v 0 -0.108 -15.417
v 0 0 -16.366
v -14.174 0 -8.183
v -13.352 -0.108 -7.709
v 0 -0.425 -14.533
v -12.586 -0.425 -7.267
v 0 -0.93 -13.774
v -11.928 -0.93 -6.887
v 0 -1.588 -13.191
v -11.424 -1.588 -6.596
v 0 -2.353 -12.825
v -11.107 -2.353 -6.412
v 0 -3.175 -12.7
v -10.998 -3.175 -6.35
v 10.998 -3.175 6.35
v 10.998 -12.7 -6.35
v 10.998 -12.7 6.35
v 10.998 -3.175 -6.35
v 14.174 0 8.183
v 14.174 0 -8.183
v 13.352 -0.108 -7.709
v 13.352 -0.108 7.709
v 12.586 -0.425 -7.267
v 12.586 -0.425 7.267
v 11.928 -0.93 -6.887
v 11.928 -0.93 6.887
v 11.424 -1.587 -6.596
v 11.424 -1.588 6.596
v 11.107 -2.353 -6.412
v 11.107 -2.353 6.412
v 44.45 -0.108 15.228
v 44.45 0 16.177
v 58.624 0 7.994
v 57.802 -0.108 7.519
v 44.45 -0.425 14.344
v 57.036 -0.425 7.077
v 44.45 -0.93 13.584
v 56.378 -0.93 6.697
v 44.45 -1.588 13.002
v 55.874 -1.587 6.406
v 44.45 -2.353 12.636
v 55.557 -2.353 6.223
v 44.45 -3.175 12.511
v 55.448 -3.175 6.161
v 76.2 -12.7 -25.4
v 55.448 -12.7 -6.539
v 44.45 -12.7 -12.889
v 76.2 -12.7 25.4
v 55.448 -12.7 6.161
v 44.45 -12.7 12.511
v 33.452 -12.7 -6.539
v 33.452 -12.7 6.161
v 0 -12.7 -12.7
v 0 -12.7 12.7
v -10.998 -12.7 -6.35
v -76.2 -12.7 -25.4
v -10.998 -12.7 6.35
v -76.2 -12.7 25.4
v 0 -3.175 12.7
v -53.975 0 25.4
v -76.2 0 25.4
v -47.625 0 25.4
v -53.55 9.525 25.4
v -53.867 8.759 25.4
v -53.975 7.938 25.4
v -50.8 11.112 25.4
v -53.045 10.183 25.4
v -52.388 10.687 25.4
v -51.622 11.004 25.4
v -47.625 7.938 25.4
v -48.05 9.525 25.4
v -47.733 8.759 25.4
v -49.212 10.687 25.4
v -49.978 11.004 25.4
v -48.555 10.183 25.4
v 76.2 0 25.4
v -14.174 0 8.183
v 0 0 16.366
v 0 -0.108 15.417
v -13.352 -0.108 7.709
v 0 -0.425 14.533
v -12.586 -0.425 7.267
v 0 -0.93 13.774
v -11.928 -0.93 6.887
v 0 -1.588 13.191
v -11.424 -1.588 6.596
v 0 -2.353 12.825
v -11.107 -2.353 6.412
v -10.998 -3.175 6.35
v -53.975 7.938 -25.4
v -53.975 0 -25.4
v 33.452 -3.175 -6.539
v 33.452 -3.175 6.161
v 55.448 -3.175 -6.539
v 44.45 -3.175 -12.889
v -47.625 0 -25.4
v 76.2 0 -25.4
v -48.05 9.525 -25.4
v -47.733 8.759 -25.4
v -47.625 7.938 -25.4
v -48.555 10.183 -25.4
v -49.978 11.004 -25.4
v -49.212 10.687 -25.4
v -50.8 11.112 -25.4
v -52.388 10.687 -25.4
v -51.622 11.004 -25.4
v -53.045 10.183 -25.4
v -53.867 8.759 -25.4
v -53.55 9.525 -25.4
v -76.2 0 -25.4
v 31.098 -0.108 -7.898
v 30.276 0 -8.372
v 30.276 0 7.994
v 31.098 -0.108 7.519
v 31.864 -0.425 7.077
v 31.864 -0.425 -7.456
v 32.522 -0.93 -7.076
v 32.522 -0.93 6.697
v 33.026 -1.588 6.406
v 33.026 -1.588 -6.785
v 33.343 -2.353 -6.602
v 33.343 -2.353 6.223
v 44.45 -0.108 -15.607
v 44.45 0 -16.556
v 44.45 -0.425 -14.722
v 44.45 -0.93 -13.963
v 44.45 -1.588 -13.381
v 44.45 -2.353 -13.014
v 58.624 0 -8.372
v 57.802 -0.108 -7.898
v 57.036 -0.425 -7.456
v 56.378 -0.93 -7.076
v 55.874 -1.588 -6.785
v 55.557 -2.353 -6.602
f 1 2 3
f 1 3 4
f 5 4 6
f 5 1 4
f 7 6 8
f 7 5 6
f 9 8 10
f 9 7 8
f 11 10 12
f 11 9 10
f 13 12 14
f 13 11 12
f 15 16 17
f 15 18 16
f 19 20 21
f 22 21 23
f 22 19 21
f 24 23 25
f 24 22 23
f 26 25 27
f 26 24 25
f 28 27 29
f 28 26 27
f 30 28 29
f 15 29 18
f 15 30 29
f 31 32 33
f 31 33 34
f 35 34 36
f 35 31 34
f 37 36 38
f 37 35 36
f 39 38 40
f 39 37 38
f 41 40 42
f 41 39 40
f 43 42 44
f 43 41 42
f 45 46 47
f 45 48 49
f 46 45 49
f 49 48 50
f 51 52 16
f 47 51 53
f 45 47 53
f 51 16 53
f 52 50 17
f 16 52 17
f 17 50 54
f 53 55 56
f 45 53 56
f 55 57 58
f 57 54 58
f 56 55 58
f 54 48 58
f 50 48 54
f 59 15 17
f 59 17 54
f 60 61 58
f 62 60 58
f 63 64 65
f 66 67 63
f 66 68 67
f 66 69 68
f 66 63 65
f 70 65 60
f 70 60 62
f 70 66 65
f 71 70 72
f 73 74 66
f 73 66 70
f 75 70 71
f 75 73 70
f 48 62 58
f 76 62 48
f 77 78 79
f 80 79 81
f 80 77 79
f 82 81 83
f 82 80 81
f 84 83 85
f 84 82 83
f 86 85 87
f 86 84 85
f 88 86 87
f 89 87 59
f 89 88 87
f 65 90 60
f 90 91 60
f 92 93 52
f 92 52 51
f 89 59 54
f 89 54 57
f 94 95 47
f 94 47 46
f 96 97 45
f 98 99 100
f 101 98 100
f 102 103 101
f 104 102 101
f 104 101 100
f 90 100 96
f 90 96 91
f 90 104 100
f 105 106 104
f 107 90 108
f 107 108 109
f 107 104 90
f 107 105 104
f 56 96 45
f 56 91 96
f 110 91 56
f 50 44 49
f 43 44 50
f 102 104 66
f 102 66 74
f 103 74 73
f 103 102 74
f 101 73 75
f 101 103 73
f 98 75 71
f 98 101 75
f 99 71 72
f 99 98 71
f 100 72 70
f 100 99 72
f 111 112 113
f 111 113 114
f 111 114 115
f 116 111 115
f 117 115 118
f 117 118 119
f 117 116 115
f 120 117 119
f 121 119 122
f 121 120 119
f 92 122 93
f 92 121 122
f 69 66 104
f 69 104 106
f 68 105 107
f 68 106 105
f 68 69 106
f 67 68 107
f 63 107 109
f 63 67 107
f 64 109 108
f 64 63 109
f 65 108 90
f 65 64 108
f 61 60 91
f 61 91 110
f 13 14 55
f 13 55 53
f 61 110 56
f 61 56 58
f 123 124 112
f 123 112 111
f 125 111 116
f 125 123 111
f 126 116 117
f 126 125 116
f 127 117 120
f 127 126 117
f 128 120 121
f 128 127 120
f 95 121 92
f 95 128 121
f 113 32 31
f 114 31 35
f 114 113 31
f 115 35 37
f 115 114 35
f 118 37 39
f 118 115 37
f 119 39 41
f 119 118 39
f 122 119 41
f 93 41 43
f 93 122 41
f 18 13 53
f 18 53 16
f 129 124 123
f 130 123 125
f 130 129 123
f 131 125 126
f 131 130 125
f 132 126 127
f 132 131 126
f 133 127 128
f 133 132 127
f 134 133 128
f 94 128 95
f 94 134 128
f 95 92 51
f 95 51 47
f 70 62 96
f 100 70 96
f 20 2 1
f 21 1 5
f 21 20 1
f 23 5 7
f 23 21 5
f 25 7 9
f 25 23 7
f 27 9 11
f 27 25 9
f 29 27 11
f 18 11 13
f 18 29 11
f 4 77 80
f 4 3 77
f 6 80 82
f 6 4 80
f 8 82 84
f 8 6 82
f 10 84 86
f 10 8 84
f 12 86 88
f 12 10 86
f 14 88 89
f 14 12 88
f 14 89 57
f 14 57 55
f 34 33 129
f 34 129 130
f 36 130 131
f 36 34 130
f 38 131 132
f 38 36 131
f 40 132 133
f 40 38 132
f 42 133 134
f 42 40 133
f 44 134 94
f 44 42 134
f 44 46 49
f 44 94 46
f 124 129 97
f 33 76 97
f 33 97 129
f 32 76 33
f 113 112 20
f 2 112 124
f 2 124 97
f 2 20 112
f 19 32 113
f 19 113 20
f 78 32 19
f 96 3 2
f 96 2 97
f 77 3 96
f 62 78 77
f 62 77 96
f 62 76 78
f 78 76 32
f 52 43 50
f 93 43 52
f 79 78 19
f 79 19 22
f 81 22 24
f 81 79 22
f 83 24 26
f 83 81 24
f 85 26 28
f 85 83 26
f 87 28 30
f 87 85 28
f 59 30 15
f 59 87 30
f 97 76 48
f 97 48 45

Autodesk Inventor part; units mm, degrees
ref_plane "YZ Plane" through (0, 0, 0) normal (1, 0, 0) x (0, 1, 0)
ref_plane "XZ Plane" through (0, 0, 0) normal (0, 1, 0) x (-1, 0, 0)
ref_plane "XY Plane" through (0, 0, 0) normal (0, 0, 1) x (1, 0, 0)
sketch "Sketch1" plane through (0, 0, 0) normal (0, 1, 0) x (-1, 0, 0)
  line L0 (-76.2, 25.4) -> (-76.2, -25.4)
  line L1 (-76.2, -25.4) -> (76.2, -25.4)
  line L2 (76.2, -25.4) -> (76.2, 25.4)
  line L3 (76.2, 25.4) -> (-76.2, 25.4)
  line L4 (-76.2, 25.4) -> (76.2, -25.4) construction
  line L5 (-76.2, -25.4) -> (76.2, 25.4) construction
  point P0 (0, 0)
  dimension "d0" = 50.8
  dimension "d1" = 152.4
extrude "Extrusion1" add sketch "Sketch1" against normal blind 12.7
sketch "Sketch2" plane through (0, 0, 0) normal (0, 1, 0) x (1, 0, 0)
  line L0 (-47.625, -25.4) -> (-47.625, 25.4)
  line L1 (-47.625, 25.4) -> (-53.975, 25.4)
  line L2 (-53.975, 25.4) -> (-53.975, -25.4)
  line L3 (-53.975, -25.4) -> (-47.625, -25.4)
  line L4 (-47.625, -25.4) -> (-53.975, 25.4) construction
  line L5 (-47.625, 25.4) -> (-53.975, -25.4) construction
  line L6 (-76.2, 25.4) -> (-76.2, -25.4) projected
  point P0 (0, 0)
  point P1 (-50.8, 0)
  dimension "d4" = 6.35
  dimension "d5" = 25.4
  dimension "d6" = 50.8
extrude "Extrusion2" add sketch "Sketch2" along normal blind 11.1125
fillet "Fillet1" radius 3.175 2 edges at (-47.625, 11.1125, 0) (-53.975, 11.1125, 0)
sketch "Sketch3" plane through (0, 0, 0) normal (0, 1, 0) x (1, 0, 0)
  line L0 (33.4515, -6.1606) -> (33.4515, 6.5394)
  line L1 (33.4515, 6.5394) -> (44.45, 12.8894)
  line L2 (44.45, 12.8894) -> (55.4485, 6.5394)
  line L3 (55.4485, 6.5394) -> (55.4485, -6.1606)
  line L4 (55.4485, -6.1606) -> (44.45, -12.5106)
  line L5 (44.45, -12.5106) -> (33.4515, -6.1606)
  line L6 (-10.9985, -6.35) -> (-10.9985, 6.35)
  line L7 (-10.9985, 6.35) -> (0, 12.7)
  line L8 (0, 12.7) -> (10.9985, 6.35)
  line L9 (10.9985, 6.35) -> (10.9985, -6.35)
  line L10 (10.9985, -6.35) -> (0, -12.7)
  line L11 (0, -12.7) -> (-10.9985, -6.35)
  line L12 (73.025, 22.225) -> (73.025, -22.225) projected
  point P0 (0, 0)
  point P1 (44.45, 0.1894)
  point P2 (0, 0)
  dimension "d12" = 25.4
  dimension "d13" = 44.45
extrude "Extrusion3" cut sketch "Sketch3" against normal through all
fillet "Fillet4" radius 3.175 12 edges at (49.9493, 0, 9.3356) (38.9507, 0, 9.3356) (33.4515, 0, -0.1894) (38.9507, 0, -9.7144) (49.9493, 0, -9.7144) (55.4485, 0, -0.1894) (10.9985, 0, 0) (5.4993, 0, 9.525) (-5.4993, 0, 9.525) (-10.9985, 0, 0) (-5.4993, 0, -9.525) (5.4993, 0, -9.525)
properties part number "Gap Guage"
